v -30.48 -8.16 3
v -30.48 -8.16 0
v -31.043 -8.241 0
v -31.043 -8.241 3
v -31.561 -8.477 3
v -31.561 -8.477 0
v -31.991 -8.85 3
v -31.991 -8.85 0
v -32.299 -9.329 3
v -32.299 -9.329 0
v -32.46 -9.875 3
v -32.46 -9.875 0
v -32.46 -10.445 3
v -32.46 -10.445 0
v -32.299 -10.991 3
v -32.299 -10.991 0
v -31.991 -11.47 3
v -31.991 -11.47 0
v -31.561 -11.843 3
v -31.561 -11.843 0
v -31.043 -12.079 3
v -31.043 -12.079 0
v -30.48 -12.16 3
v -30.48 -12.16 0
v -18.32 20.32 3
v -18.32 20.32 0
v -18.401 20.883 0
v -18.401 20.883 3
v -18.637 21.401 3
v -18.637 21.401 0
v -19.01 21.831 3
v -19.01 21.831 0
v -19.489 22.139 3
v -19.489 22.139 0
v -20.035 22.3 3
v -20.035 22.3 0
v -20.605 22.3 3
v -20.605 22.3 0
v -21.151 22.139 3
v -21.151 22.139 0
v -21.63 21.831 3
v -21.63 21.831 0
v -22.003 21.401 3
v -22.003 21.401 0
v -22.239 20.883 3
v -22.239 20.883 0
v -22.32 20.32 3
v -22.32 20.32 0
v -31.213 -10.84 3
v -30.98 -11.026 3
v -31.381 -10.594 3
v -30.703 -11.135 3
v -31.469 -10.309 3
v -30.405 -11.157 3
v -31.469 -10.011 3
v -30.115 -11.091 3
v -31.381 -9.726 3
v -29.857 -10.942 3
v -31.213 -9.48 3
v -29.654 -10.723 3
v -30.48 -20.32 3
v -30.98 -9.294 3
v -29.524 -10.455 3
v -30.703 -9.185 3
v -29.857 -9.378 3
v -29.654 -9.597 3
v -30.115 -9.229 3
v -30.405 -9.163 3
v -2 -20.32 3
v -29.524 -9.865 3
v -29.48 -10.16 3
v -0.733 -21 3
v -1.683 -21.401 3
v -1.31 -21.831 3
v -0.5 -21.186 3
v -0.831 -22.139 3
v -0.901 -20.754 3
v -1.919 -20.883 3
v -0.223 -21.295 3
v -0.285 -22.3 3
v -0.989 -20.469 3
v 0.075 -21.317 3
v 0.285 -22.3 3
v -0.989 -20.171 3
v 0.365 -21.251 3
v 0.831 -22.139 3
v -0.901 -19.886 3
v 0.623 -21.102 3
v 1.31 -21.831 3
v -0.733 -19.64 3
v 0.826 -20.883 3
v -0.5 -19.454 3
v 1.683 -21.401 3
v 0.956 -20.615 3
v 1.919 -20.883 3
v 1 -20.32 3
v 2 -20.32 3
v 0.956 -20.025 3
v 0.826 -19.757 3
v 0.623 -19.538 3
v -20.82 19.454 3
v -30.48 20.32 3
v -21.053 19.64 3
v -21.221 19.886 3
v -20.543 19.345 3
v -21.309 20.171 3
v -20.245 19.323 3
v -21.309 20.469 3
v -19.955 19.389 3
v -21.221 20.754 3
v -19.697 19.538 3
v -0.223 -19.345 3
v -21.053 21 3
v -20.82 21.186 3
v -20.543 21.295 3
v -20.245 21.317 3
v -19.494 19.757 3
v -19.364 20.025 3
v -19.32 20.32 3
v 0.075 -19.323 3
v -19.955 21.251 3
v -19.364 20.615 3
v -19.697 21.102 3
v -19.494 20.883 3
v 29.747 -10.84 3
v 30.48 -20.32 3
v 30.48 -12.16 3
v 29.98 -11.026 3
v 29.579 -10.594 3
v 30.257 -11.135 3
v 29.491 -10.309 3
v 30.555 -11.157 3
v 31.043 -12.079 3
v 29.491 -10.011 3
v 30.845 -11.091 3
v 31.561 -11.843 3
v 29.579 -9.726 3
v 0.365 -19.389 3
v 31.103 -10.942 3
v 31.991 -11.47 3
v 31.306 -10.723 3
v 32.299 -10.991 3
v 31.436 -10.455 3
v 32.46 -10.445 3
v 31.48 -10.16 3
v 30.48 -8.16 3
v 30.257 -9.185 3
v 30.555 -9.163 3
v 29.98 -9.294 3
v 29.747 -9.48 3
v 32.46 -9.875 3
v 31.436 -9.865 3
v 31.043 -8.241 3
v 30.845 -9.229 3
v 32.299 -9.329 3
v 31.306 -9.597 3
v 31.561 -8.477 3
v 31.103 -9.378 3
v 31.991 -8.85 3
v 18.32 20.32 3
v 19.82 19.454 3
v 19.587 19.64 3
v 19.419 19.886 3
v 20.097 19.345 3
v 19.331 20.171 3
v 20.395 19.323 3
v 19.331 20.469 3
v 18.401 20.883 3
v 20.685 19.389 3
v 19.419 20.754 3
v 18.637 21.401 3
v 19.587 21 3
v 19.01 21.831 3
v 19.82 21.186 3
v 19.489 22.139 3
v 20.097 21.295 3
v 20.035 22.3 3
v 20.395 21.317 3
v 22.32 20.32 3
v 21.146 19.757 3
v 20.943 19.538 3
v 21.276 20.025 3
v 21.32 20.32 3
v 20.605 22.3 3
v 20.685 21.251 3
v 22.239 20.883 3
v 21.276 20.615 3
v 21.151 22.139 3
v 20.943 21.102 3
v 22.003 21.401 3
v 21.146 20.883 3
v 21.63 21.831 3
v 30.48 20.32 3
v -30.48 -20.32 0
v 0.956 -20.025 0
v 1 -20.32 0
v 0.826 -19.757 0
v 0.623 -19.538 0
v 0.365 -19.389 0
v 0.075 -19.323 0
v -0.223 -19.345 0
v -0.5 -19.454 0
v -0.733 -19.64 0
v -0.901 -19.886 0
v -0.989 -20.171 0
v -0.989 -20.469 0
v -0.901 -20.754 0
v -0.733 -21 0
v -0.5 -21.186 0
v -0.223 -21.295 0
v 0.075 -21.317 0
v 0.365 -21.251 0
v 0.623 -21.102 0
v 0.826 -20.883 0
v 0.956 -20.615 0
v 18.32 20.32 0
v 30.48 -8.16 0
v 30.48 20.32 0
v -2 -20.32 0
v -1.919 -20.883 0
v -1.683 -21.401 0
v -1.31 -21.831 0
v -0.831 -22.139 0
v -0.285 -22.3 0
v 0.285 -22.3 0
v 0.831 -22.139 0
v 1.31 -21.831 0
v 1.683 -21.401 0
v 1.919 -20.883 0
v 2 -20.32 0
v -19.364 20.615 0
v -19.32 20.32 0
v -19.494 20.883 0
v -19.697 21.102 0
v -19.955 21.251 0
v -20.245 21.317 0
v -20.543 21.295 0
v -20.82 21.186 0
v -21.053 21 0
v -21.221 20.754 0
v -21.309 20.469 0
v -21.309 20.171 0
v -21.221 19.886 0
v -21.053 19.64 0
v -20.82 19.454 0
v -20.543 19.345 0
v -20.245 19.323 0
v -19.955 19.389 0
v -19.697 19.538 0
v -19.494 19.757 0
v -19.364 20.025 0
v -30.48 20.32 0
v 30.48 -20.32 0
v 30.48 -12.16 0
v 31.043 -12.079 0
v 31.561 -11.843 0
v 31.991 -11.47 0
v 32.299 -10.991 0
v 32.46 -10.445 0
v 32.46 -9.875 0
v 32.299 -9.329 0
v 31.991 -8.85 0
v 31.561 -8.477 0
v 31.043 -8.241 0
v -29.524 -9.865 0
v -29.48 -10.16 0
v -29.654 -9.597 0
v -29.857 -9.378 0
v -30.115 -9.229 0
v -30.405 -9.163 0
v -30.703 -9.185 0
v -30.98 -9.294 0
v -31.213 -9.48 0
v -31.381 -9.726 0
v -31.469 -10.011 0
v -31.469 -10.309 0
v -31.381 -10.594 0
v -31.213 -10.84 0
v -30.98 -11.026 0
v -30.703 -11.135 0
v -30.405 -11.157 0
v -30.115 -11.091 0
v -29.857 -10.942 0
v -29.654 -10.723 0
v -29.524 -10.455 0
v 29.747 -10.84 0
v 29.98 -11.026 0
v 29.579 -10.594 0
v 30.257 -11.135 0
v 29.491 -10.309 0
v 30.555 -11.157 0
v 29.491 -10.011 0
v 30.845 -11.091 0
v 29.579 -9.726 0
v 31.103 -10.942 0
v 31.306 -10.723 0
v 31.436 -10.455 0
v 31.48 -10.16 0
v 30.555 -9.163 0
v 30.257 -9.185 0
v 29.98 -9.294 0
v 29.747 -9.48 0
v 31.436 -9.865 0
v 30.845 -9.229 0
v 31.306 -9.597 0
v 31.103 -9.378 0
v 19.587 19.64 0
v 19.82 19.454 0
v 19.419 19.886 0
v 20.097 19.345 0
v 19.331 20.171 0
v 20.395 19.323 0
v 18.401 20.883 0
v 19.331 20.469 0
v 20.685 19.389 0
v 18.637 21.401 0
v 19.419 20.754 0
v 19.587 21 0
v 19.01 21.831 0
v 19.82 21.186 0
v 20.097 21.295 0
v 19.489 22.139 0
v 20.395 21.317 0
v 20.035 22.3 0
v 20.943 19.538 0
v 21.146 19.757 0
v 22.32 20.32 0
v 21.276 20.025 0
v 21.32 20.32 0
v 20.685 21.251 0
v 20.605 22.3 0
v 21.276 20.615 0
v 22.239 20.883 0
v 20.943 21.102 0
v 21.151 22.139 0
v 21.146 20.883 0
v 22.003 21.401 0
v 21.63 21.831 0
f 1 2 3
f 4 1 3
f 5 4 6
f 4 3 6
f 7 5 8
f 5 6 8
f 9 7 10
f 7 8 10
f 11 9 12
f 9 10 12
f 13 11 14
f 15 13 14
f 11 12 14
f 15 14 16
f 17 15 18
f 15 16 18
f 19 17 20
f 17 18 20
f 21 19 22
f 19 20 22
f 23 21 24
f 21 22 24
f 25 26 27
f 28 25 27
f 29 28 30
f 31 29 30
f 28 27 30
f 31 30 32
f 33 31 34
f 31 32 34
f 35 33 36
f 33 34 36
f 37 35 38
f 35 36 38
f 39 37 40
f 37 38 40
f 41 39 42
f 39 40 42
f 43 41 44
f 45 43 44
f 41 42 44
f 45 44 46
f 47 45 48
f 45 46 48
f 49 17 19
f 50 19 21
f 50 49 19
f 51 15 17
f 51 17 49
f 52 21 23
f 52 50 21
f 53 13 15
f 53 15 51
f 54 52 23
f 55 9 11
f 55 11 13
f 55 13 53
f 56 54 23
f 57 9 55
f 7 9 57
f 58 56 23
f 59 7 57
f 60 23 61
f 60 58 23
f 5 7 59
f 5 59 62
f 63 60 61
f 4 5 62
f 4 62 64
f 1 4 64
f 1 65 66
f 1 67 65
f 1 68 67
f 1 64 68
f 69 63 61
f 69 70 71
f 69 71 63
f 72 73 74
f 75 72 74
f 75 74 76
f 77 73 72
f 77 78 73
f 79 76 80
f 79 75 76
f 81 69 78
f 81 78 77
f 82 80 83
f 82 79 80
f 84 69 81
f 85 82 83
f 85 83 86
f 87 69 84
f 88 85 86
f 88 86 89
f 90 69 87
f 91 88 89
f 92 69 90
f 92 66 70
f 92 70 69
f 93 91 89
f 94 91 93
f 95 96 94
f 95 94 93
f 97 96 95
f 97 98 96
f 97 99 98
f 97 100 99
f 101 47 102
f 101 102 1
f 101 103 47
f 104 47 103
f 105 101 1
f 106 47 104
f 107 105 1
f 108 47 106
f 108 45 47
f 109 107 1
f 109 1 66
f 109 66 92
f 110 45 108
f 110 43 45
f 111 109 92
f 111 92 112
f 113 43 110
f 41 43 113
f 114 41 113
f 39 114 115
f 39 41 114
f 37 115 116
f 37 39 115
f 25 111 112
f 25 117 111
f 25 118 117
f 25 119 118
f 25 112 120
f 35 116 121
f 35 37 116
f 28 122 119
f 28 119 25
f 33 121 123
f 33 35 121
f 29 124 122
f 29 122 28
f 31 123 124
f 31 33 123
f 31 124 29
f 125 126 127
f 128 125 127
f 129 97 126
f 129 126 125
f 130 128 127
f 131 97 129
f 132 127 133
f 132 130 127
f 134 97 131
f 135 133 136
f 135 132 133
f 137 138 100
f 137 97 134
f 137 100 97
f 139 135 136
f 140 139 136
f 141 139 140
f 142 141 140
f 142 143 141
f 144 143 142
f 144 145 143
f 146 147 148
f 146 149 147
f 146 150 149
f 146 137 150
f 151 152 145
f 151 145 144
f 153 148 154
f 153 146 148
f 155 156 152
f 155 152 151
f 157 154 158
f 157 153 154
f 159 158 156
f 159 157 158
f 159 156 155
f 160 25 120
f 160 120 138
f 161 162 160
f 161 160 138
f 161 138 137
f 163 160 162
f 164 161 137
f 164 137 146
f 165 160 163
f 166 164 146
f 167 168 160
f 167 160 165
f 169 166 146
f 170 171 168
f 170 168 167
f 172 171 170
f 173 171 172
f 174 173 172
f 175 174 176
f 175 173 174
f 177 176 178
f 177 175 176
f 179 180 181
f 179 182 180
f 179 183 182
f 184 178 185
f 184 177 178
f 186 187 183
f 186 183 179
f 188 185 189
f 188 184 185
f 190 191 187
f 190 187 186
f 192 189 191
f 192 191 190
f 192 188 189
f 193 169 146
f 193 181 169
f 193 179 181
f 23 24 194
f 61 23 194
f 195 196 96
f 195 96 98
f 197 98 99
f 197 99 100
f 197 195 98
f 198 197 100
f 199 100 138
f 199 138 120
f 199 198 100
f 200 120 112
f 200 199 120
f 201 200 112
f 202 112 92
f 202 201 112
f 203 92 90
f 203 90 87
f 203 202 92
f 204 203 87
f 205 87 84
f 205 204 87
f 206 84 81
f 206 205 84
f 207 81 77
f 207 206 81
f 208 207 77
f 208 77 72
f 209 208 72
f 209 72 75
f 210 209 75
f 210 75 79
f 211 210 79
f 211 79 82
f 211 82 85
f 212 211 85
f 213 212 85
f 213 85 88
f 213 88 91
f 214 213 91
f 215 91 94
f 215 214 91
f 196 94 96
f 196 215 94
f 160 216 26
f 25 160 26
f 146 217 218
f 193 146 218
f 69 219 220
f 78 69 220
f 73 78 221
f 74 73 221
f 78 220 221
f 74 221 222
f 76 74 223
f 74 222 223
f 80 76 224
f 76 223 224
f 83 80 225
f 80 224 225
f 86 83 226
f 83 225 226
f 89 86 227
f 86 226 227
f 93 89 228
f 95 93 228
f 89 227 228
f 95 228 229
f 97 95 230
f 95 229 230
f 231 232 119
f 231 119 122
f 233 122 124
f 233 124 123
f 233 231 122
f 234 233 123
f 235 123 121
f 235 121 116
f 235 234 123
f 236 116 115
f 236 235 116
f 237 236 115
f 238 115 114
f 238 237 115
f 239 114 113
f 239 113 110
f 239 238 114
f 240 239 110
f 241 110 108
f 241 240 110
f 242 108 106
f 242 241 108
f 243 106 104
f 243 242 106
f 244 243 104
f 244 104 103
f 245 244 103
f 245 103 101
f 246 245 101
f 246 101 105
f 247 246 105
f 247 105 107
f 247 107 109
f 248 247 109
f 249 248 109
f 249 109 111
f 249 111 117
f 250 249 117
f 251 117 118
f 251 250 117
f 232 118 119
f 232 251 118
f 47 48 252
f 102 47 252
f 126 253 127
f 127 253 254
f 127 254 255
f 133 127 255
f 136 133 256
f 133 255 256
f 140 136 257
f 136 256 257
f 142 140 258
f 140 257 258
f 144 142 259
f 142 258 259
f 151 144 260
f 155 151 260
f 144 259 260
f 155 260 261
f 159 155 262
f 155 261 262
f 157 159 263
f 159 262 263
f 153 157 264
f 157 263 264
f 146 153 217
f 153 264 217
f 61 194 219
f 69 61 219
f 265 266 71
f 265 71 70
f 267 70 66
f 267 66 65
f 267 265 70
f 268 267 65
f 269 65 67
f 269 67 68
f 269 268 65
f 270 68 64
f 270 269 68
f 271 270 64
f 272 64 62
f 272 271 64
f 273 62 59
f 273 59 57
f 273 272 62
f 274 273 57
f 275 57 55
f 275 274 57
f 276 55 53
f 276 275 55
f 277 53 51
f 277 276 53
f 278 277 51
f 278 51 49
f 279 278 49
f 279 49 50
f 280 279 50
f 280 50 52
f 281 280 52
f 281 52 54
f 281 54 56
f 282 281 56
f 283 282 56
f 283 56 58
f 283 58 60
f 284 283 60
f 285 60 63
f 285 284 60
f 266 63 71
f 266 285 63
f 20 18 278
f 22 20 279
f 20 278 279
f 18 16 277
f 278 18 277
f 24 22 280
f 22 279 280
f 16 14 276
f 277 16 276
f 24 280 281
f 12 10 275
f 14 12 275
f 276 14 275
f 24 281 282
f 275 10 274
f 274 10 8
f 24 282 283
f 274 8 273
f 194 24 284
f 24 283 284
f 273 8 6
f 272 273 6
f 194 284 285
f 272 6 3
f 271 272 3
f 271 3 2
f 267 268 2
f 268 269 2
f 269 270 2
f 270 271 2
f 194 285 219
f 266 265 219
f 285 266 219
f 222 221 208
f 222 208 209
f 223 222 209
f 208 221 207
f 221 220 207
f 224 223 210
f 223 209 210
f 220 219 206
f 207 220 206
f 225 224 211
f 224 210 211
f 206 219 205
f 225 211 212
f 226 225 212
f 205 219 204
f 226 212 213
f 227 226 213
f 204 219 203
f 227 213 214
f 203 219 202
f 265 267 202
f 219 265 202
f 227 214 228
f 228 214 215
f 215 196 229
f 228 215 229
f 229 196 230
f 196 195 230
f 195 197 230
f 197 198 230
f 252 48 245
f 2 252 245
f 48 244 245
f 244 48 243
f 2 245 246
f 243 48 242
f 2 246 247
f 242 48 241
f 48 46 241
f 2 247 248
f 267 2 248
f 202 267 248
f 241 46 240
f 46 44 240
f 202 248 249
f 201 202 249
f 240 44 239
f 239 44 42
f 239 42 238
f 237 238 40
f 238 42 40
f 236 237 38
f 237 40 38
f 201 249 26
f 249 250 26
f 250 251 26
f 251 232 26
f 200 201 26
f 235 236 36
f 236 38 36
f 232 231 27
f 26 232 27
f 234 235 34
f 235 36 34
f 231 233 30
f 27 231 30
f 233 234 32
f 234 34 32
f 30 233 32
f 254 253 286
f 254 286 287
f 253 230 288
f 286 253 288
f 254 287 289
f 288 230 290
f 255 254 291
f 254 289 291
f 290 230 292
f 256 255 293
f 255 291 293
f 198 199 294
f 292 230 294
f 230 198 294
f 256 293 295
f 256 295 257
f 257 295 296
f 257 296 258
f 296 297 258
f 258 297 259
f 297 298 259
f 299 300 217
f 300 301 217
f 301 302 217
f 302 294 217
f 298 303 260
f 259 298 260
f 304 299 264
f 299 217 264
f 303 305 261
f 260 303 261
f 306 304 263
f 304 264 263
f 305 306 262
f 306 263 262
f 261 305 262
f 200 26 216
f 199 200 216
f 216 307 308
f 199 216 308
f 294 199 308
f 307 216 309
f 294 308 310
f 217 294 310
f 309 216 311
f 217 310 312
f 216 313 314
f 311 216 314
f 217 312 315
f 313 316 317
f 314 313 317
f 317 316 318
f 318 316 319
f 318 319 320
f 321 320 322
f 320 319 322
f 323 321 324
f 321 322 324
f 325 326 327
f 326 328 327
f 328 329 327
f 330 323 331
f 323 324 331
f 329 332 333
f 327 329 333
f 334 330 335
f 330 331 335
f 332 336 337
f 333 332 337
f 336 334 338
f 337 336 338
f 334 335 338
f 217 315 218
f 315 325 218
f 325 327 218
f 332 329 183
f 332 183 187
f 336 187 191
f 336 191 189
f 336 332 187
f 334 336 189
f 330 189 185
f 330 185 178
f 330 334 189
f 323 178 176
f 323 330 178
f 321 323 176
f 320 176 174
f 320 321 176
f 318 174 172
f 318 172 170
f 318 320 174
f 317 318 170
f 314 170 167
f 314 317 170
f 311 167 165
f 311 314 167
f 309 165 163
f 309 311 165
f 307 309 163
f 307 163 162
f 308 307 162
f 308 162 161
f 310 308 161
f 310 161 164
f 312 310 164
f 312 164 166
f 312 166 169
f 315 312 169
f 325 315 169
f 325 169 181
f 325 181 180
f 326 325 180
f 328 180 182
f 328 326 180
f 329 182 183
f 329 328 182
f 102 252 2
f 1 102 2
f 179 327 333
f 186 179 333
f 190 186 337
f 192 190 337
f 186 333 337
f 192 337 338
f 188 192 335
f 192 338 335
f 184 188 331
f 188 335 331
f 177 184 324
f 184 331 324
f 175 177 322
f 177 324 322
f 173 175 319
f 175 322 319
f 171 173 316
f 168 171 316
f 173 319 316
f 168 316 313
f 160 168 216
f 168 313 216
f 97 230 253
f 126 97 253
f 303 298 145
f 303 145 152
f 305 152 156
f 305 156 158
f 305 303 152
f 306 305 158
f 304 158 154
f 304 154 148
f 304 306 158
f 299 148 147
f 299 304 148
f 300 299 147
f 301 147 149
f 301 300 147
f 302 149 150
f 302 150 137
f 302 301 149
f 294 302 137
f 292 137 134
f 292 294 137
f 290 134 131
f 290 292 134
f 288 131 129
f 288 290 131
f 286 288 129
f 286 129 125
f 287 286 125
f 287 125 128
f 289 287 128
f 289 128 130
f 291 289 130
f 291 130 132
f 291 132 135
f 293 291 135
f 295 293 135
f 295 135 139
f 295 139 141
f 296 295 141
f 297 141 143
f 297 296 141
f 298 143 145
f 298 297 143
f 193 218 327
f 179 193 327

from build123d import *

# Parameters (mm, degrees)
ESQUISSE1_R        = 1
BOSS_EXTRU_2_DEPTH = 3


with BuildPart() as part:
    # Esquisse1 → Boss.-Extru.2 (new body)
    with BuildSketch(Plane.XY):
        with BuildLine():
            Line((30.48, -20.32), (30.48, -12.16))
            ThreePointArc((30.48, -12.16), (32.48, -10.16), (30.48, -8.16))
            Line((30.48, -8.16), (30.48, 20.32))
            Line((30.48, 20.32), (22.32, 20.32))
            ThreePointArc((22.32, 20.32), (20.32, 22.32), (18.32, 20.32))
            Line((18.32, 20.32), (-18.32, 20.32))
            ThreePointArc((-18.32, 20.32), (-20.32, 22.32), (-22.32, 20.32))
            Line((-22.32, 20.32), (-30.48, 20.32))
            Line((-30.48, 20.32), (-30.48, -8.16))
            ThreePointArc((-30.48, -8.16), (-32.48, -10.16), (-30.48, -12.16))
            Line((-30.48, -12.16), (-30.48, -20.32))
            Line((-30.48, -20.32), (-2, -20.32))
            ThreePointArc((-2, -20.32), (0, -22.32), (2, -20.32))
            Line((2, -20.32), (30.48, -20.32))
        make_face()
        with Locations((-30.48, -10.16)):
            Circle(ESQUISSE1_R, mode=Mode.SUBTRACT)
        with Locations((0, -20.32)):
            Circle(ESQUISSE1_R, mode=Mode.SUBTRACT)
        with Locations((30.48, -10.16)):
            Circle(ESQUISSE1_R, mode=Mode.SUBTRACT)
        with Locations((20.32, 20.32)):
            Circle(ESQUISSE1_R, mode=Mode.SUBTRACT)
        with Locations((-20.32, 20.32)):
            Circle(ESQUISSE1_R, mode=Mode.SUBTRACT)
    extrude(amount=BOSS_EXTRU_2_DEPTH)


solid = part.part
